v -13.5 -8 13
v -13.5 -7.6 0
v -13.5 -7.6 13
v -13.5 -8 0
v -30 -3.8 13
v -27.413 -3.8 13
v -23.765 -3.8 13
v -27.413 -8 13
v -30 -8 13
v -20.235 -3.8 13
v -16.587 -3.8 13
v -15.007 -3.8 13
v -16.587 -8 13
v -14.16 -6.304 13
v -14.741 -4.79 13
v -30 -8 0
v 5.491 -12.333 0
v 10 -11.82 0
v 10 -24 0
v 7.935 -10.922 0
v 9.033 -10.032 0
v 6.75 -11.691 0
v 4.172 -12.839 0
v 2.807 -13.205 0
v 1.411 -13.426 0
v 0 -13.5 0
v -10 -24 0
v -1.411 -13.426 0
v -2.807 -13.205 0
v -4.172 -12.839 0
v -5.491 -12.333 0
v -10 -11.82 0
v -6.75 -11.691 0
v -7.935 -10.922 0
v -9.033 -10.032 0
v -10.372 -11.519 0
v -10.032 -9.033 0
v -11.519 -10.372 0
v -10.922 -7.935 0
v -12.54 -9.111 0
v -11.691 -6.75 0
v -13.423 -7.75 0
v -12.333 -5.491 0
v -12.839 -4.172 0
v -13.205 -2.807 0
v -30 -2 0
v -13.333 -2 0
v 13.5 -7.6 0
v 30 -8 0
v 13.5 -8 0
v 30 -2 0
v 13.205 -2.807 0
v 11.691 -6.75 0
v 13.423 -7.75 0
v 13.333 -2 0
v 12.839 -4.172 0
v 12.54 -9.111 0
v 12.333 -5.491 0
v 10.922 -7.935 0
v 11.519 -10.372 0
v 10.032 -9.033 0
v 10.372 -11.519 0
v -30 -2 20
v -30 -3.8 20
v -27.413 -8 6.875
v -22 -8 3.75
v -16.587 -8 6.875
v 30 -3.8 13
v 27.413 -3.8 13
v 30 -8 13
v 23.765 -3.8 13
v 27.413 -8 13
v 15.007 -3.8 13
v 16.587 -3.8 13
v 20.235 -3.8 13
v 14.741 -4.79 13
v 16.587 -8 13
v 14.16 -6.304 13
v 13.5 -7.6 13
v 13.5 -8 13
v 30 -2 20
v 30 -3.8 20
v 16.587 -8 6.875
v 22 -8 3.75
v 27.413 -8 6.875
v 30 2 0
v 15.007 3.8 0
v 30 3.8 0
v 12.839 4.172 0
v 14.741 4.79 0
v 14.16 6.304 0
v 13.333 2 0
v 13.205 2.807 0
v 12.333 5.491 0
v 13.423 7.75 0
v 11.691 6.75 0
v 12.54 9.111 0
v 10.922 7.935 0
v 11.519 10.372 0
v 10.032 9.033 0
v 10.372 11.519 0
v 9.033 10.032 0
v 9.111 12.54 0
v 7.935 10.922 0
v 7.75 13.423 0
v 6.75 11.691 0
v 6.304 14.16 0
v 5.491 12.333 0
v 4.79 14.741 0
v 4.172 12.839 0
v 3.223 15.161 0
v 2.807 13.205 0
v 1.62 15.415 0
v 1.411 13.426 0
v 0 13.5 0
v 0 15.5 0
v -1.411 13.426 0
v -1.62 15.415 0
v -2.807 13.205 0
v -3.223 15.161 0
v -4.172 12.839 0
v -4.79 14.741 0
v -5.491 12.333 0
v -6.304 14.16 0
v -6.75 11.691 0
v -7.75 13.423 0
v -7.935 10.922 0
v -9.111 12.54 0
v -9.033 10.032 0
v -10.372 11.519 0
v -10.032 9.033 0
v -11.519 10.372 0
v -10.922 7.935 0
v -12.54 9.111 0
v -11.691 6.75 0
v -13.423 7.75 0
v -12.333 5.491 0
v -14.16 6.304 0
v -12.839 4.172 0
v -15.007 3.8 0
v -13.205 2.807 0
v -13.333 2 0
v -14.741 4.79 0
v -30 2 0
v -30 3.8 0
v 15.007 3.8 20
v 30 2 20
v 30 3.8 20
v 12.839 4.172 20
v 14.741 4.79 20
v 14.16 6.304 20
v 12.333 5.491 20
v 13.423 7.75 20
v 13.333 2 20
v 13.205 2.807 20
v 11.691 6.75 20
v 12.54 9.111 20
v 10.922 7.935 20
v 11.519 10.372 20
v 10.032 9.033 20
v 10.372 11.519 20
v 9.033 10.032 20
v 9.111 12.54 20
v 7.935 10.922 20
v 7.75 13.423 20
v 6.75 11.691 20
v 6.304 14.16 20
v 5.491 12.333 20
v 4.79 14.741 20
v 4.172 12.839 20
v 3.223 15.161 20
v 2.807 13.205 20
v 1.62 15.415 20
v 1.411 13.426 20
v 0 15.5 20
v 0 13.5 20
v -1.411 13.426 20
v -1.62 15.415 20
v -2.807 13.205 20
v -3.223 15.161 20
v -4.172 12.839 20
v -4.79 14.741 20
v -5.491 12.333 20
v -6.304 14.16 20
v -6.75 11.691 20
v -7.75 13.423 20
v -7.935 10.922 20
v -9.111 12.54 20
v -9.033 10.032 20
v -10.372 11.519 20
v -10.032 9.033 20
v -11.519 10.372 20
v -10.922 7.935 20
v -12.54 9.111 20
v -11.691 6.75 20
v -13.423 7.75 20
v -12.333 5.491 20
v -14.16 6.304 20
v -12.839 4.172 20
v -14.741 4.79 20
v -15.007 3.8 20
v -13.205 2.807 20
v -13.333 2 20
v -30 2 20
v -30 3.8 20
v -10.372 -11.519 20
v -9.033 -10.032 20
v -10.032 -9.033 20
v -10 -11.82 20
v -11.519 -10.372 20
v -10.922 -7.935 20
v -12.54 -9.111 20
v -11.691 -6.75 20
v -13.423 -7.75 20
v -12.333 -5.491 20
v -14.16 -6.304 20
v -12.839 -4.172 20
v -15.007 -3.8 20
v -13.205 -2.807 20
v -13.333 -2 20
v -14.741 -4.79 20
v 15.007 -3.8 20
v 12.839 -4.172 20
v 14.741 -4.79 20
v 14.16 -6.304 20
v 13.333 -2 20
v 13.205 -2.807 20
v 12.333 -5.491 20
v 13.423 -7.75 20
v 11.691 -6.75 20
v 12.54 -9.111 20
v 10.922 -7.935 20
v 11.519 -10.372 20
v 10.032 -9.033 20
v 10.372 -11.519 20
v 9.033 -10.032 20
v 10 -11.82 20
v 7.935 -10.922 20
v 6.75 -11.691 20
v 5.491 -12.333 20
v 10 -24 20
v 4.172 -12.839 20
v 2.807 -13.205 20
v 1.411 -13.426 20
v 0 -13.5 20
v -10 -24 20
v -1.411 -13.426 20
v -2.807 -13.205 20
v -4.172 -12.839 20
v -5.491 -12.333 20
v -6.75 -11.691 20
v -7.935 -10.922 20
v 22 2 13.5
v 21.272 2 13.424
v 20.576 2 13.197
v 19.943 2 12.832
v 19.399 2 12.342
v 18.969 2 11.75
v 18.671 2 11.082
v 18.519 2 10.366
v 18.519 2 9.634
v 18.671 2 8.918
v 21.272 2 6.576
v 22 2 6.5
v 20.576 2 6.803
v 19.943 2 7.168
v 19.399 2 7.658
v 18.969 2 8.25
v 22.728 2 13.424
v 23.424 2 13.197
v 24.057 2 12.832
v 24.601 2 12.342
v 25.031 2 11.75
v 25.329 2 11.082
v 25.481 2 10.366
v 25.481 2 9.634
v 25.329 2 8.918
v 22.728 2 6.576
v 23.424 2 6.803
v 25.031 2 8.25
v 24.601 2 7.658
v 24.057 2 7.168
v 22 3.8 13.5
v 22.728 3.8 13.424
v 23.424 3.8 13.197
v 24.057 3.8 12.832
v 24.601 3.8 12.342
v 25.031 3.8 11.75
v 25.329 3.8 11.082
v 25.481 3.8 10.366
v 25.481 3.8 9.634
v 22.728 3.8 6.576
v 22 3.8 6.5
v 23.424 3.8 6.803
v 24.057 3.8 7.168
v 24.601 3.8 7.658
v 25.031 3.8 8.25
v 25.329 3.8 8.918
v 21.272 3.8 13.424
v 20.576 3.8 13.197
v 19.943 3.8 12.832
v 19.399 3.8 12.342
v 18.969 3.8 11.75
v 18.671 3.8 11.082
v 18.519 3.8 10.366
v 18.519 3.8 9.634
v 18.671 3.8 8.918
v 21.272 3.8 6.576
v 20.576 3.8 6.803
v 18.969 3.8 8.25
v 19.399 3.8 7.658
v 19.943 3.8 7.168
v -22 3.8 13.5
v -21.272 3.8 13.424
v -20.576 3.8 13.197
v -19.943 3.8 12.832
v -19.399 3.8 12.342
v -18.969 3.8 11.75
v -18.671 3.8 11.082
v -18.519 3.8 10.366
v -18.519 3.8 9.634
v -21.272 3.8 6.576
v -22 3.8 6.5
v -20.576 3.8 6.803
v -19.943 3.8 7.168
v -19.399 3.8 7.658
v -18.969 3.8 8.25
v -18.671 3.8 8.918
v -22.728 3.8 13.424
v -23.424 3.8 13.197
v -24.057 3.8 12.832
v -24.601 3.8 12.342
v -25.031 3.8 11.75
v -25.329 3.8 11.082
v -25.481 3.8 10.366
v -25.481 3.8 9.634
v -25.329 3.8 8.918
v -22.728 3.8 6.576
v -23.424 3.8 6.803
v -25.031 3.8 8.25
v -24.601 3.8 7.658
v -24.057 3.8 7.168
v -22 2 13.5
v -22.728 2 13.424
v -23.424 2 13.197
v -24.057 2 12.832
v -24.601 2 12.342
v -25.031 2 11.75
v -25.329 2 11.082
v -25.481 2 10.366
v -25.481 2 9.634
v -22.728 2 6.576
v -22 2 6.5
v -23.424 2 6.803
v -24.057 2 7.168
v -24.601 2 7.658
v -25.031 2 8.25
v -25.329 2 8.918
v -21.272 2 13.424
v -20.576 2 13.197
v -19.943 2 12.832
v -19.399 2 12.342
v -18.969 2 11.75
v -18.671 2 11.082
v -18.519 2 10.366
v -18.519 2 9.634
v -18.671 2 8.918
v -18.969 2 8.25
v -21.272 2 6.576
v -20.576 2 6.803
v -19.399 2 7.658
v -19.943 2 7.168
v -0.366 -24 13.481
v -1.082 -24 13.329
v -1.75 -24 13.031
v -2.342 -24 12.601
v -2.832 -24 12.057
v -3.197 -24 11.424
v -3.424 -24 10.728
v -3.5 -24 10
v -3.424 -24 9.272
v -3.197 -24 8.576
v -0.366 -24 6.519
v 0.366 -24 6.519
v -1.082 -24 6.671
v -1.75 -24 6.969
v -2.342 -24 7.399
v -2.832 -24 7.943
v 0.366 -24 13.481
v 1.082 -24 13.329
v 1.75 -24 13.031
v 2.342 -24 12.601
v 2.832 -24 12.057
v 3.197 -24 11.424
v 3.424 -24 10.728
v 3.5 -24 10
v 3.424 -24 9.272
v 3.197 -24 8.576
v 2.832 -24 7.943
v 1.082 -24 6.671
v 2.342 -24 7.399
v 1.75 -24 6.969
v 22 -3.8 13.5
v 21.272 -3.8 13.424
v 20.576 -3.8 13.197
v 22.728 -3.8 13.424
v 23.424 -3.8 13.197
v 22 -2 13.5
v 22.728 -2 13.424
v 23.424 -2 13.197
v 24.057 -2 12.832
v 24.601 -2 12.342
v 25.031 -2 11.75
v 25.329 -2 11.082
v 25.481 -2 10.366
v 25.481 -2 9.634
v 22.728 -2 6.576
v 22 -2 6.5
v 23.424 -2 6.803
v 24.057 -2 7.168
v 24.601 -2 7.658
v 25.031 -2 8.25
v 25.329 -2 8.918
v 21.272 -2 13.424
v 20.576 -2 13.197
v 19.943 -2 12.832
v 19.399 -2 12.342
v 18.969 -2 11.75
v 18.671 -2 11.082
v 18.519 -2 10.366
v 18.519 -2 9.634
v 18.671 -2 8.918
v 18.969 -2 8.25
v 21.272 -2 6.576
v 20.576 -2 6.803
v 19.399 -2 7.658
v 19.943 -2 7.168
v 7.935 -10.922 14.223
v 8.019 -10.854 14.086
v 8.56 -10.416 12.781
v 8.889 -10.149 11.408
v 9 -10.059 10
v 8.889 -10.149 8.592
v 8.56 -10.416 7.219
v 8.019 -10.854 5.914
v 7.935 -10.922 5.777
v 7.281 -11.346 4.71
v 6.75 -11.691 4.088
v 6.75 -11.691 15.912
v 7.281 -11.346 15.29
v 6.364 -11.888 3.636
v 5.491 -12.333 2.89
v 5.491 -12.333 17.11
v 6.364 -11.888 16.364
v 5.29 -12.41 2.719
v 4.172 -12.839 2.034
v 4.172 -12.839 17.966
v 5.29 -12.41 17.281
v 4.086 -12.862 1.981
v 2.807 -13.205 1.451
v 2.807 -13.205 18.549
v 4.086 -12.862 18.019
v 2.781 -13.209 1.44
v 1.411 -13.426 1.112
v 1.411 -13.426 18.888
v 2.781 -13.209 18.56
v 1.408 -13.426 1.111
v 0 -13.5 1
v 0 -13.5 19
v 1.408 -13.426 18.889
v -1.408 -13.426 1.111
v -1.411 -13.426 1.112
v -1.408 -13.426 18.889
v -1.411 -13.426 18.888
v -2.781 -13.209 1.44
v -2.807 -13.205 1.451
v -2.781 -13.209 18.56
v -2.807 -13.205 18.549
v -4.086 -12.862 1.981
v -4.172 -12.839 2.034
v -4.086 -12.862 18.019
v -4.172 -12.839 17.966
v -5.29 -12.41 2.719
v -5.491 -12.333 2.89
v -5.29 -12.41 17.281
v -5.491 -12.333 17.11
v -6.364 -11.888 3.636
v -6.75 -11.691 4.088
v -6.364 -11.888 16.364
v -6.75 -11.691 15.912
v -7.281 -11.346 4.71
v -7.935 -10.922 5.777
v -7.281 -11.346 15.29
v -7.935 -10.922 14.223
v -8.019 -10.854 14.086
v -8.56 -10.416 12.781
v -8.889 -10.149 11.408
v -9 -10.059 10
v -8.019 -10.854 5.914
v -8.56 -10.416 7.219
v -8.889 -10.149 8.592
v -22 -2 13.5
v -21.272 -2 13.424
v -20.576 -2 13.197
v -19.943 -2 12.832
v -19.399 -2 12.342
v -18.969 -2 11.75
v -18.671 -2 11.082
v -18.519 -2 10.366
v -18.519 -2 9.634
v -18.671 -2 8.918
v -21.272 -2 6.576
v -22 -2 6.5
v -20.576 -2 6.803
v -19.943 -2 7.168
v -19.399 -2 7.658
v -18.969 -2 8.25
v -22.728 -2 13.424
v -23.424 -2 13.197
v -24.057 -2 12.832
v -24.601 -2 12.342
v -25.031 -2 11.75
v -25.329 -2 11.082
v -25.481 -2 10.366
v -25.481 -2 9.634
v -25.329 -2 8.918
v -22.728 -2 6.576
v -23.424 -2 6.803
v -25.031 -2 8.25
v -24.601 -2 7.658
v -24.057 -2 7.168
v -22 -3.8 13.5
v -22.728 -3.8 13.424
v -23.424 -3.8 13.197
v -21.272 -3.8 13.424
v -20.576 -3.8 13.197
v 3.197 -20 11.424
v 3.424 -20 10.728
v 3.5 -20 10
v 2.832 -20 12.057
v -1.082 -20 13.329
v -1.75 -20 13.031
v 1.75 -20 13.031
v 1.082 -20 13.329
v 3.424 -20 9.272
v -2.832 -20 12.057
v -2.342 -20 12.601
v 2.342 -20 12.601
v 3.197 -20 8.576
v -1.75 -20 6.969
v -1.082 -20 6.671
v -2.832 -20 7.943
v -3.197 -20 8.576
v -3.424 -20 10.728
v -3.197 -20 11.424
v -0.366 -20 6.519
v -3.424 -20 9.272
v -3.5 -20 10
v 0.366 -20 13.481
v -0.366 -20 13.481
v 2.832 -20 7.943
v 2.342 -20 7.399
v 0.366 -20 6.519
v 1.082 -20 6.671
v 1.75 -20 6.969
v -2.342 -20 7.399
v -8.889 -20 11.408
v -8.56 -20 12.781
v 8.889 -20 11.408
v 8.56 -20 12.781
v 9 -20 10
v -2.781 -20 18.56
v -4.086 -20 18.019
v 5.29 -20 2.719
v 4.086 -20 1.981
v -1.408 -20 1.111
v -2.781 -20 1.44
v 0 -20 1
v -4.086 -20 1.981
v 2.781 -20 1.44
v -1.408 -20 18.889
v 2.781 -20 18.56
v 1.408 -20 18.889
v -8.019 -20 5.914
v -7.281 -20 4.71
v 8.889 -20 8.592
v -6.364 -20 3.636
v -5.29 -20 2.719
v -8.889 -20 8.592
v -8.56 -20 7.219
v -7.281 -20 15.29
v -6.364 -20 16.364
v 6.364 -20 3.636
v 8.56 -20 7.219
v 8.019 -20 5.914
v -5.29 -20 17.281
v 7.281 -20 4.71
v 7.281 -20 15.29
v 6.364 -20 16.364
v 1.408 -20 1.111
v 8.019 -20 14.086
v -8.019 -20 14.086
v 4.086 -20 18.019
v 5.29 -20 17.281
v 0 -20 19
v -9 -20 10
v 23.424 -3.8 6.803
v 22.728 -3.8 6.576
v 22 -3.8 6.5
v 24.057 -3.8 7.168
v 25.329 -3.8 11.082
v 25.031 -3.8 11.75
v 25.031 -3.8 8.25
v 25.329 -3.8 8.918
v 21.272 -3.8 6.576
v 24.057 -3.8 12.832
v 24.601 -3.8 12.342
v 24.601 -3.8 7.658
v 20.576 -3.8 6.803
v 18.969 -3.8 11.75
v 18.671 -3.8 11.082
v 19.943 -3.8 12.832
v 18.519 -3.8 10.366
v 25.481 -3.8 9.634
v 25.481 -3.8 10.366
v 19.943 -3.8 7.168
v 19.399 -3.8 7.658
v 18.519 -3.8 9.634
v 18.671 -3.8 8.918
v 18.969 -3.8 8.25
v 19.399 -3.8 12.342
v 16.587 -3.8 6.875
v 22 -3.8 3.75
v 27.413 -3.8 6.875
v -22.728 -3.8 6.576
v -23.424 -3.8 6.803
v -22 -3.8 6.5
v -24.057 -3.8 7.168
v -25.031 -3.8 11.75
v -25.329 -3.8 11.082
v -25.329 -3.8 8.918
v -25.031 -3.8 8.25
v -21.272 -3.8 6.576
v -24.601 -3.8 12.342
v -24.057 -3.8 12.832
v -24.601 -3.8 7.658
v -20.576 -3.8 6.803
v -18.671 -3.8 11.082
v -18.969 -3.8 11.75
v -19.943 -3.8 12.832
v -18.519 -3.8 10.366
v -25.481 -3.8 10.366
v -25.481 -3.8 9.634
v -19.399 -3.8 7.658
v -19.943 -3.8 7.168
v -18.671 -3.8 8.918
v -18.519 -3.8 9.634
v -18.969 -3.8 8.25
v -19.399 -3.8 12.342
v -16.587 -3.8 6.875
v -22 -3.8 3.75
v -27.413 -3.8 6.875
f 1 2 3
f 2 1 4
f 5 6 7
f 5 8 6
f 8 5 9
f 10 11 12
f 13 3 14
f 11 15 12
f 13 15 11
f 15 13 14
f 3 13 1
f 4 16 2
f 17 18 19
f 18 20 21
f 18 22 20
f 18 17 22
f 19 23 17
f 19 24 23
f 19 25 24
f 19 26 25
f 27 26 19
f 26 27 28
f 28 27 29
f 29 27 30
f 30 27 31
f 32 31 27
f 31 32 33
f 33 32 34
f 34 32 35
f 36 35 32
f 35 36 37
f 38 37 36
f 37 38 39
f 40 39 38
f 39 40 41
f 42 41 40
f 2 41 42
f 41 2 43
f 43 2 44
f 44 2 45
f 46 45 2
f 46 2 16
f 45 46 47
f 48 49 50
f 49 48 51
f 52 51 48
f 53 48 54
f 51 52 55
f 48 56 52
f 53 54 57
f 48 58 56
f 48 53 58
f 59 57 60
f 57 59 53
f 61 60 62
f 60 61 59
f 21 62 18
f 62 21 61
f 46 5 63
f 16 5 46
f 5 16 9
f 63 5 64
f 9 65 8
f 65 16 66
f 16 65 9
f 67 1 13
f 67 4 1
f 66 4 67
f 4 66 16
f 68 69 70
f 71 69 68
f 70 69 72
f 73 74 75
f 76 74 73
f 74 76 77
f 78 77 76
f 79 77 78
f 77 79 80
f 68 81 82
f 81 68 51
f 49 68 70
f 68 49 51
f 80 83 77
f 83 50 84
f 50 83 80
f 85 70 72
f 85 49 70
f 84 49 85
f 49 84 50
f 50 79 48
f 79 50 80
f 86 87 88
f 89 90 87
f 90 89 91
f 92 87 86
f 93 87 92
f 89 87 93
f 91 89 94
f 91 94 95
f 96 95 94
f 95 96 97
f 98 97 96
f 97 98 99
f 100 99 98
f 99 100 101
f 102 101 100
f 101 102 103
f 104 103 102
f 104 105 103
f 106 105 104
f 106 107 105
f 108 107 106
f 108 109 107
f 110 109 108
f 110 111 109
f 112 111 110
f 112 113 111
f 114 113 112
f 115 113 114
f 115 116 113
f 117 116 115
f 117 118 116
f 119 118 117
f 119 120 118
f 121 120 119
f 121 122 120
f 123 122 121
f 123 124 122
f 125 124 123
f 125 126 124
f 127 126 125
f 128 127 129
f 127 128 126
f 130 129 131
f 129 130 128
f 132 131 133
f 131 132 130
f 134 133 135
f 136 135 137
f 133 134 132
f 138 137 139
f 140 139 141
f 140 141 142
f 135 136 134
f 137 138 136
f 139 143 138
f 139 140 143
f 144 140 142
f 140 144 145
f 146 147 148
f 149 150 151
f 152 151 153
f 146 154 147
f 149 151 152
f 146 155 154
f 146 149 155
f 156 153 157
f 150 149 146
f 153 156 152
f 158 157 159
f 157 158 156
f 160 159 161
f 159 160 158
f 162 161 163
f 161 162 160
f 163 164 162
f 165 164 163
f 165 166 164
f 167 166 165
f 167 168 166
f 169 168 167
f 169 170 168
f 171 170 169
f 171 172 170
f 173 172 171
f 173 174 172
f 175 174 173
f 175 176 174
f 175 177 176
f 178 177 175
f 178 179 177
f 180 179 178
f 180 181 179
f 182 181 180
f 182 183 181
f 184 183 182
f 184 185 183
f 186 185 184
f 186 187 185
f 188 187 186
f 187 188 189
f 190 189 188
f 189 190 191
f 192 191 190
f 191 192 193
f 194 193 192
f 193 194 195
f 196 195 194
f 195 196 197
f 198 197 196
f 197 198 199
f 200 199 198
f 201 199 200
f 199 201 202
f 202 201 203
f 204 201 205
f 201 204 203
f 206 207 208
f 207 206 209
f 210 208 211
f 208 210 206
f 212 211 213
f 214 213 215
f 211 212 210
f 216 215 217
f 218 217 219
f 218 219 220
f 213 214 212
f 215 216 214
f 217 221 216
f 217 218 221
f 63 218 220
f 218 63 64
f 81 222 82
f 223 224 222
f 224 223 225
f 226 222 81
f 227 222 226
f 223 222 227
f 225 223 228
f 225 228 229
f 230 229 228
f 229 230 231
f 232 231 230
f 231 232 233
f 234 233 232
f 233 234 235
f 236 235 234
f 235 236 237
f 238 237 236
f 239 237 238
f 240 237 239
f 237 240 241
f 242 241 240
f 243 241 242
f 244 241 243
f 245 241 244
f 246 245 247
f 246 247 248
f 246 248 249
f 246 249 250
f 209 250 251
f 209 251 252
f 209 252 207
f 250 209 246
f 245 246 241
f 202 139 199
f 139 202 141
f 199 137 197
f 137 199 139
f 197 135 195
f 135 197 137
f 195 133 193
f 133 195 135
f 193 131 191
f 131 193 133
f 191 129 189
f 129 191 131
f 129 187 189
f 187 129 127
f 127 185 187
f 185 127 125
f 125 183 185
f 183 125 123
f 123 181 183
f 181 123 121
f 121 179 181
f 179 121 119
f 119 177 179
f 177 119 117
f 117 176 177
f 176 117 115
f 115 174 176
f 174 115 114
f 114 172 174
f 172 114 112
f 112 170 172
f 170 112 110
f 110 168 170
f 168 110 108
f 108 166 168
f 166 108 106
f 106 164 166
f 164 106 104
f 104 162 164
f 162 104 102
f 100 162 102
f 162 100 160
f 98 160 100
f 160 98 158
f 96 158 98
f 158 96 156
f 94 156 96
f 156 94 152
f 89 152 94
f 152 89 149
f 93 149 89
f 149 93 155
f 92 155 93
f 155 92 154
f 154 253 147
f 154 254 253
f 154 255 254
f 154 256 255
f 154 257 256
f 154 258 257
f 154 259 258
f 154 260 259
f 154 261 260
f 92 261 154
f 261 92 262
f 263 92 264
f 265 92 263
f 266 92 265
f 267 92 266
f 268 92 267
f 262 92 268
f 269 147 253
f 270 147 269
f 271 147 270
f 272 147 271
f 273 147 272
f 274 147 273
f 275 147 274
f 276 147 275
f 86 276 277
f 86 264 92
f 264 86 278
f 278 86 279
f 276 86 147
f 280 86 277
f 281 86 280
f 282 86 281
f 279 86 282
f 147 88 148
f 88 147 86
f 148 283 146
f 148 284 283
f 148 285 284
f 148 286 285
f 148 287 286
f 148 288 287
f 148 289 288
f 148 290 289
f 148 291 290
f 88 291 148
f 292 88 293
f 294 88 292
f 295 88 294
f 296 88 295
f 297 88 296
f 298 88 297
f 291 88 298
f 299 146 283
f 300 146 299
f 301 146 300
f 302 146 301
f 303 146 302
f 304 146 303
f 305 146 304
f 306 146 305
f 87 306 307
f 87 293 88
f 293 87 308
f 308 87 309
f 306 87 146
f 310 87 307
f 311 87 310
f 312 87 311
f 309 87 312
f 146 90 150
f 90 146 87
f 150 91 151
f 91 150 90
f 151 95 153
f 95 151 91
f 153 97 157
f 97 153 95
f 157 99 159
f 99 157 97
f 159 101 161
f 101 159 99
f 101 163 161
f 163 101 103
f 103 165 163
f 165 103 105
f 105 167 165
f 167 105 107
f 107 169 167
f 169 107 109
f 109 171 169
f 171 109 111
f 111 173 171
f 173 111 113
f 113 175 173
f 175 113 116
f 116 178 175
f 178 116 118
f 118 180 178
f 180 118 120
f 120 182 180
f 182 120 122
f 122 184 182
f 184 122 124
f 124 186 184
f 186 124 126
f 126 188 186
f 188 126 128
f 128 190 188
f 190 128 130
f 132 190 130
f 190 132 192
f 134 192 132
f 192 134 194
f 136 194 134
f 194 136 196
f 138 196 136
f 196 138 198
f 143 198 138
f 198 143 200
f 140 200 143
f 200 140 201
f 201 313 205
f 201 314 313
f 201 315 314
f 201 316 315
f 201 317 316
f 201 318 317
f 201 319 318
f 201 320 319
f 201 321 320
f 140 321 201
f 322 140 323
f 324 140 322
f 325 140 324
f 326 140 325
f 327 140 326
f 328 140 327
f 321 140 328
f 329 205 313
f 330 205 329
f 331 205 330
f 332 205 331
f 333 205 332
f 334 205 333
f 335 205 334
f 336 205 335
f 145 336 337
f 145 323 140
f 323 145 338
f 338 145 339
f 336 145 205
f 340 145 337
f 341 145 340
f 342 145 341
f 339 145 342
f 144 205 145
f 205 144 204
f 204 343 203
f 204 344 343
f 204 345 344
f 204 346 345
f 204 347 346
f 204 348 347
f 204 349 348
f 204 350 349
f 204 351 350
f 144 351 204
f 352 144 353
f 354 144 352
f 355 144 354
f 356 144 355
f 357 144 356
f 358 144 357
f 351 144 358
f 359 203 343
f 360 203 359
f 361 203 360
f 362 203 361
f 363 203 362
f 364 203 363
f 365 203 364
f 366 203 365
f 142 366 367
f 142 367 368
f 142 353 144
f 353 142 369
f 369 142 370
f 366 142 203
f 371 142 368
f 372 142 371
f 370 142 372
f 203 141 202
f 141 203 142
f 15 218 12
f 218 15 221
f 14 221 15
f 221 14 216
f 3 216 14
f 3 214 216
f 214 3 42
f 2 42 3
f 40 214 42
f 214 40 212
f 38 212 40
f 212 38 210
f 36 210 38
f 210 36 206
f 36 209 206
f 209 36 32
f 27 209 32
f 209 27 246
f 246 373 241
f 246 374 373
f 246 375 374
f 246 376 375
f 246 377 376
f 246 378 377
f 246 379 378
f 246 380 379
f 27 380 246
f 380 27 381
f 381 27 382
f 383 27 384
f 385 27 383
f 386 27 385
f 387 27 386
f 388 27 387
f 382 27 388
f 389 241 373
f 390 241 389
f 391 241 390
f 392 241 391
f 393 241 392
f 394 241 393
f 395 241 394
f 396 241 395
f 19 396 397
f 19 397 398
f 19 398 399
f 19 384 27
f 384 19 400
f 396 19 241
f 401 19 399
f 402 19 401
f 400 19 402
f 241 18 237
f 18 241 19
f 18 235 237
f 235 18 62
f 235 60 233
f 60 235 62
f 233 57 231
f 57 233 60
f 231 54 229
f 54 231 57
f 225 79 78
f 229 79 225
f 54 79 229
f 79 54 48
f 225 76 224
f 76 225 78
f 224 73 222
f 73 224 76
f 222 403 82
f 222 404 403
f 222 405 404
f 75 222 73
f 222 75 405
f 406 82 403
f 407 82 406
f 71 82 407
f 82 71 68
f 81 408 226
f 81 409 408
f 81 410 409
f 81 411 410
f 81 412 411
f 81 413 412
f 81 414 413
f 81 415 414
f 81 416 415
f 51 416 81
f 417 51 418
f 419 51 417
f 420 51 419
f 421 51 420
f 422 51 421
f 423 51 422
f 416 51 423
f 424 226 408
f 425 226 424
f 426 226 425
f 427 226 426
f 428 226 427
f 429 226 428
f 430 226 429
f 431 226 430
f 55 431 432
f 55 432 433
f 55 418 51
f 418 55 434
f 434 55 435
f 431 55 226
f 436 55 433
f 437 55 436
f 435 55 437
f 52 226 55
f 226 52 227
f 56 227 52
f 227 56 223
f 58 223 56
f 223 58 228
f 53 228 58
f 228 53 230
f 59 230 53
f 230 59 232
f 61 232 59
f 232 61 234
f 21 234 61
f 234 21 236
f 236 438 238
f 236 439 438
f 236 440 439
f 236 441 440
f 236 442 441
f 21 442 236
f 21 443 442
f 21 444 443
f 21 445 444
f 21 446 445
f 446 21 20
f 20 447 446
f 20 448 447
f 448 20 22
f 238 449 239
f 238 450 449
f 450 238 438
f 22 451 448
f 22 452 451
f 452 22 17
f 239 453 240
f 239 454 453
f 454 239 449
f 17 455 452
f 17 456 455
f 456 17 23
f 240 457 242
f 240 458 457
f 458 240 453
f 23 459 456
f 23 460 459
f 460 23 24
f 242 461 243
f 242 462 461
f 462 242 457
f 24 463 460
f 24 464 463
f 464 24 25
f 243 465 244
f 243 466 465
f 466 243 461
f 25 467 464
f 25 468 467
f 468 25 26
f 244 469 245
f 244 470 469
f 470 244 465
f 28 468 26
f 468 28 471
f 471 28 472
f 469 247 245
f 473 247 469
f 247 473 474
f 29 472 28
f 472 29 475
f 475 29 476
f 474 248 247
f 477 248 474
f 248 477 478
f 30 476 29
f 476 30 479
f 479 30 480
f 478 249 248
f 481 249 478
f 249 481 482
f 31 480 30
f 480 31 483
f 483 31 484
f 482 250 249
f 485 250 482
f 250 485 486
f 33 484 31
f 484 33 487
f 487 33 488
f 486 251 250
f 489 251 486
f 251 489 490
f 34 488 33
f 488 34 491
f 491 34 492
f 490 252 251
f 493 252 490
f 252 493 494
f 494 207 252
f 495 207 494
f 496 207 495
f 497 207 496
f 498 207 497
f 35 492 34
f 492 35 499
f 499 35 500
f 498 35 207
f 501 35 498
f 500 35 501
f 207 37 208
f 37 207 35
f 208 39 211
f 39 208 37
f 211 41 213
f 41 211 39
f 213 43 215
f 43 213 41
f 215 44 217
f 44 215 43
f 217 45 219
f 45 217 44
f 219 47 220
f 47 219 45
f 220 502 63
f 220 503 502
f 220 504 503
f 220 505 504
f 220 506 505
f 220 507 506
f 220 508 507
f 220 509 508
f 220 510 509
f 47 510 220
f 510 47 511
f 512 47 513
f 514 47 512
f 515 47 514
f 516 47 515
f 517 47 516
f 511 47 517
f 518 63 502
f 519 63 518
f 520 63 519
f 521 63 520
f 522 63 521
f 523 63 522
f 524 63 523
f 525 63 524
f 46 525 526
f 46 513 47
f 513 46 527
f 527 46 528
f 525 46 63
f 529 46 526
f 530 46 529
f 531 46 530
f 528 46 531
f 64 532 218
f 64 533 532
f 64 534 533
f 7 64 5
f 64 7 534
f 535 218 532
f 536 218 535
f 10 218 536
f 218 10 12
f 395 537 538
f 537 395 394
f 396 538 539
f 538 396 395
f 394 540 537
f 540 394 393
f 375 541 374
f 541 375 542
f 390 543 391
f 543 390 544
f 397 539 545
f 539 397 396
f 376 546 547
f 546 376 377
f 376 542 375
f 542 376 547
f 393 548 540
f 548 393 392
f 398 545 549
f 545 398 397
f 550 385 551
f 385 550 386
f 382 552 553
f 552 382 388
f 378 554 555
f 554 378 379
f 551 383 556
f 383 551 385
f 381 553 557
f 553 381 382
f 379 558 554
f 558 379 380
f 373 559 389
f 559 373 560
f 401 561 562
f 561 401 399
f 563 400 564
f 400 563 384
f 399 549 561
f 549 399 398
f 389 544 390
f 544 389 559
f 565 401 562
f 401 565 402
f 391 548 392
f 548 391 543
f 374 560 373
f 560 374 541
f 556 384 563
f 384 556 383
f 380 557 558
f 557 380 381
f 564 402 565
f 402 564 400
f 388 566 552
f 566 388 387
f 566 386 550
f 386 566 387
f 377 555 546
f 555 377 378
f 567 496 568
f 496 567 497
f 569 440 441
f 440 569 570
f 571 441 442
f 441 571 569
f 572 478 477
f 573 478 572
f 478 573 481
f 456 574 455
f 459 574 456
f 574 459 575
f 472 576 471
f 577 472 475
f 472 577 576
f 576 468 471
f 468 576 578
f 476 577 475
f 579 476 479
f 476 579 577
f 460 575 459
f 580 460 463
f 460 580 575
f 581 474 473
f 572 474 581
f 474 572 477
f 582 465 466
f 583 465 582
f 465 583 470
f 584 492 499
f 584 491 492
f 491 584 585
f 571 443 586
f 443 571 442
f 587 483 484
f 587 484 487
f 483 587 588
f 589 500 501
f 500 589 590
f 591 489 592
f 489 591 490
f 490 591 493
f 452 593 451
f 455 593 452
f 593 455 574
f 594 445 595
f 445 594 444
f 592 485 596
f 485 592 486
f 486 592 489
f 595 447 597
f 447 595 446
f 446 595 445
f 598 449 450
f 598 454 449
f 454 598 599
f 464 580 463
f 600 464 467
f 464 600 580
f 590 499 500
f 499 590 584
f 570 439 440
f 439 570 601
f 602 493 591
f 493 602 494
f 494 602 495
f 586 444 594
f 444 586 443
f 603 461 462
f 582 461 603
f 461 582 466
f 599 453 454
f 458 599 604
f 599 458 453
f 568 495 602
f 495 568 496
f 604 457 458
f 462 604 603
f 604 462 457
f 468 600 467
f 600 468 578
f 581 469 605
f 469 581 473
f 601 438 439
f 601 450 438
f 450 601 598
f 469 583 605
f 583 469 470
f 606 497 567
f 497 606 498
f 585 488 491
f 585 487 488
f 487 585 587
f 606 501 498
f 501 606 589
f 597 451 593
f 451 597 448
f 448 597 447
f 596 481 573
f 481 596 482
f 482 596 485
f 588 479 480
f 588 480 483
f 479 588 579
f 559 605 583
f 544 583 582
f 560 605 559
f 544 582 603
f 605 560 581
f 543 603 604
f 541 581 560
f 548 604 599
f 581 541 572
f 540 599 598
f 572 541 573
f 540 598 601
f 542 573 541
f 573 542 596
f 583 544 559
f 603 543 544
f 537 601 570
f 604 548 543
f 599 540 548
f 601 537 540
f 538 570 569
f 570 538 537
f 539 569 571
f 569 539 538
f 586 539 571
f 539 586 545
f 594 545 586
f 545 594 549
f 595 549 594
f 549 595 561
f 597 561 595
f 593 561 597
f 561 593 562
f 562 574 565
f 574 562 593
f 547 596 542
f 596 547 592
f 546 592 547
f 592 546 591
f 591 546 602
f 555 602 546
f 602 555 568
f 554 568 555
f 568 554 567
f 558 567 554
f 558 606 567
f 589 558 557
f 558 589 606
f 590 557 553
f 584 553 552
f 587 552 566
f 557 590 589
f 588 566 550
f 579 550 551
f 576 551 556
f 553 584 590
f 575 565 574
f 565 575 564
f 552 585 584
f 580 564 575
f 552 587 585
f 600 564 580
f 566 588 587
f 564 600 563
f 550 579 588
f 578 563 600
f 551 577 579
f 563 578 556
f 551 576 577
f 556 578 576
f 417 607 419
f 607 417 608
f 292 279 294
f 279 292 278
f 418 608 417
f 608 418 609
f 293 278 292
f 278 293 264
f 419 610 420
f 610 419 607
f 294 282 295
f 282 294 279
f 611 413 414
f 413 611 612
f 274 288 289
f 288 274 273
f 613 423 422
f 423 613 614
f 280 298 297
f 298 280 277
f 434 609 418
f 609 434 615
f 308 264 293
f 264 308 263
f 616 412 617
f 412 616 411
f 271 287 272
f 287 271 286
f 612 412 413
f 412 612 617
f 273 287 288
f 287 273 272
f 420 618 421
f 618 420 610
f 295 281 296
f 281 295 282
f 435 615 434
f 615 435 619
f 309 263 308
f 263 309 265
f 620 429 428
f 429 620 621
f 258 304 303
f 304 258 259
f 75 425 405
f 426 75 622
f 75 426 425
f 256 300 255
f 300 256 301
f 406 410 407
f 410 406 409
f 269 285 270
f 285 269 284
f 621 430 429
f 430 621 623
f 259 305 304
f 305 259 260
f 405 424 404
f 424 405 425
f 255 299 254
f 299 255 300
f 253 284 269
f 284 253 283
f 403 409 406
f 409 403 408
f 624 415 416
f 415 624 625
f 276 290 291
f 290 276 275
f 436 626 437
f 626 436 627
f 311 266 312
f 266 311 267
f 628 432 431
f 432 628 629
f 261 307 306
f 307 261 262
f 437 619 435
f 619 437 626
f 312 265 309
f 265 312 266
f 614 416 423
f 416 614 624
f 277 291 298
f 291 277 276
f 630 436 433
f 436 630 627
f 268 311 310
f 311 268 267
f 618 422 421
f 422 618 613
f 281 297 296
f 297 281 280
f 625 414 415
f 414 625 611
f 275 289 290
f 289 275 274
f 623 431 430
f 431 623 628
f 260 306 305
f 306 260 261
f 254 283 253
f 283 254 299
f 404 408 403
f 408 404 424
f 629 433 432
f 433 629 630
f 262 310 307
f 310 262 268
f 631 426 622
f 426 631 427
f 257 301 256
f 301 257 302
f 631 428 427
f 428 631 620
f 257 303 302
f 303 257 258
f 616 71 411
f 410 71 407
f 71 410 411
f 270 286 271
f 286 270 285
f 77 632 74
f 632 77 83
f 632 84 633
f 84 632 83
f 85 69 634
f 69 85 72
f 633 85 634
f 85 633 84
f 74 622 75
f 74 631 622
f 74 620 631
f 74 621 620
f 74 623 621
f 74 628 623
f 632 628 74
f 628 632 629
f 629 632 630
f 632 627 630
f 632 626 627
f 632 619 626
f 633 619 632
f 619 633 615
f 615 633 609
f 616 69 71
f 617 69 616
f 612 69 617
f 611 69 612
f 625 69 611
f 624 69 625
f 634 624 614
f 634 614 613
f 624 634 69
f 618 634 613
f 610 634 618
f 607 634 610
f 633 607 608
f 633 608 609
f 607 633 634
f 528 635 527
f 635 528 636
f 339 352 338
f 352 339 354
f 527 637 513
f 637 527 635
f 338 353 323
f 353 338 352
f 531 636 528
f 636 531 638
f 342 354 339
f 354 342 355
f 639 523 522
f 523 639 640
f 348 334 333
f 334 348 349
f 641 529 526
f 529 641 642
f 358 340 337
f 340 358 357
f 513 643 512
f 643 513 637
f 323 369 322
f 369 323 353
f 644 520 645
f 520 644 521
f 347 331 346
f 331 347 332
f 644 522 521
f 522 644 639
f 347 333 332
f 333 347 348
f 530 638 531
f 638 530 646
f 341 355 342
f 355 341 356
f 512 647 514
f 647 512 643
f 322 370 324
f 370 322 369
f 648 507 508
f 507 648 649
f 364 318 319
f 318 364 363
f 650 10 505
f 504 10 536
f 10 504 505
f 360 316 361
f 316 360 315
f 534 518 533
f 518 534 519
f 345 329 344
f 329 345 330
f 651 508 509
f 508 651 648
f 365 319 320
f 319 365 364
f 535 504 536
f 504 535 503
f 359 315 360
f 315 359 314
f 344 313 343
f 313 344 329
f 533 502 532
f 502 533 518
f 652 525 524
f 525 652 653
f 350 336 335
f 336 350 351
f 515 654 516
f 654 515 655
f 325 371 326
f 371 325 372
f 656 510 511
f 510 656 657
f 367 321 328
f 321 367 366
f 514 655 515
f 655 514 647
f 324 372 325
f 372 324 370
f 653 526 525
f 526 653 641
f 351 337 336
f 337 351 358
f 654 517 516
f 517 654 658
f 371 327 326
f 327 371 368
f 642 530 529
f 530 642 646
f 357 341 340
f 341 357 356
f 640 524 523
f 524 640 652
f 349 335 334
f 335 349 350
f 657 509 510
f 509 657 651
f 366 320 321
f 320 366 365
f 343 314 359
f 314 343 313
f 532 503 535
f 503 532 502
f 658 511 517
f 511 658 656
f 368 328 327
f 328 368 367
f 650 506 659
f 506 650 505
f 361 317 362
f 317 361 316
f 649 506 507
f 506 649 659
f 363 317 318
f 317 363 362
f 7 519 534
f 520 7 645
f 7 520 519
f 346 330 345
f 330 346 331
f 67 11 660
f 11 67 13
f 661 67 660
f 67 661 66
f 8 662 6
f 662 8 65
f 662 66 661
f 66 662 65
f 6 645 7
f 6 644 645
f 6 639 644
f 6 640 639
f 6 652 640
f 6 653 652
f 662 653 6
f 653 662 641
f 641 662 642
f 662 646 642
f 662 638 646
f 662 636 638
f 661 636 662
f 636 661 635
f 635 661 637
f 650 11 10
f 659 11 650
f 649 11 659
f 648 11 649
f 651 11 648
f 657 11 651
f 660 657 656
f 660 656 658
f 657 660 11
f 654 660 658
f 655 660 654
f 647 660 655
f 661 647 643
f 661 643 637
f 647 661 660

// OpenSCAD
difference() {
  union() {
    linear_extrude(20,convexity=4) {
      difference() {
        union() {
          circle(d=31,$fn=60);
        for(m=[0,1]) mirror([m,0])
          translate([0,-3.8,0]) square([30,7.6]);
          translate([-10,-24]) square([20,20]);
        }
        circle(d=27,$fn=60);
        for(m=[0,1]) mirror([m,0])
        translate([0,-2,0]) square([30,4]);
      }
    }
        for(m=[0,1]) mirror([m,0])
    translate([-30,-8]) cube([16.5,5,13]);
  }
  translate([0,0,10]) rotate([90,0]) {
    cylinder(d=7,h=30,$fn=30);
    cylinder(d=18,h=20,$fn=40);
  }
  for(m=[0,1]) mirror([m,0])
    rotate([0,0,-90]) translate([-10,22,10]) rotate([0,90]) {
      cylinder(d=7,h=20,$fn=30);
      translate([0,0,13.8]) cylinder(d=12.5,h=6,$fn=6);
    }
}
